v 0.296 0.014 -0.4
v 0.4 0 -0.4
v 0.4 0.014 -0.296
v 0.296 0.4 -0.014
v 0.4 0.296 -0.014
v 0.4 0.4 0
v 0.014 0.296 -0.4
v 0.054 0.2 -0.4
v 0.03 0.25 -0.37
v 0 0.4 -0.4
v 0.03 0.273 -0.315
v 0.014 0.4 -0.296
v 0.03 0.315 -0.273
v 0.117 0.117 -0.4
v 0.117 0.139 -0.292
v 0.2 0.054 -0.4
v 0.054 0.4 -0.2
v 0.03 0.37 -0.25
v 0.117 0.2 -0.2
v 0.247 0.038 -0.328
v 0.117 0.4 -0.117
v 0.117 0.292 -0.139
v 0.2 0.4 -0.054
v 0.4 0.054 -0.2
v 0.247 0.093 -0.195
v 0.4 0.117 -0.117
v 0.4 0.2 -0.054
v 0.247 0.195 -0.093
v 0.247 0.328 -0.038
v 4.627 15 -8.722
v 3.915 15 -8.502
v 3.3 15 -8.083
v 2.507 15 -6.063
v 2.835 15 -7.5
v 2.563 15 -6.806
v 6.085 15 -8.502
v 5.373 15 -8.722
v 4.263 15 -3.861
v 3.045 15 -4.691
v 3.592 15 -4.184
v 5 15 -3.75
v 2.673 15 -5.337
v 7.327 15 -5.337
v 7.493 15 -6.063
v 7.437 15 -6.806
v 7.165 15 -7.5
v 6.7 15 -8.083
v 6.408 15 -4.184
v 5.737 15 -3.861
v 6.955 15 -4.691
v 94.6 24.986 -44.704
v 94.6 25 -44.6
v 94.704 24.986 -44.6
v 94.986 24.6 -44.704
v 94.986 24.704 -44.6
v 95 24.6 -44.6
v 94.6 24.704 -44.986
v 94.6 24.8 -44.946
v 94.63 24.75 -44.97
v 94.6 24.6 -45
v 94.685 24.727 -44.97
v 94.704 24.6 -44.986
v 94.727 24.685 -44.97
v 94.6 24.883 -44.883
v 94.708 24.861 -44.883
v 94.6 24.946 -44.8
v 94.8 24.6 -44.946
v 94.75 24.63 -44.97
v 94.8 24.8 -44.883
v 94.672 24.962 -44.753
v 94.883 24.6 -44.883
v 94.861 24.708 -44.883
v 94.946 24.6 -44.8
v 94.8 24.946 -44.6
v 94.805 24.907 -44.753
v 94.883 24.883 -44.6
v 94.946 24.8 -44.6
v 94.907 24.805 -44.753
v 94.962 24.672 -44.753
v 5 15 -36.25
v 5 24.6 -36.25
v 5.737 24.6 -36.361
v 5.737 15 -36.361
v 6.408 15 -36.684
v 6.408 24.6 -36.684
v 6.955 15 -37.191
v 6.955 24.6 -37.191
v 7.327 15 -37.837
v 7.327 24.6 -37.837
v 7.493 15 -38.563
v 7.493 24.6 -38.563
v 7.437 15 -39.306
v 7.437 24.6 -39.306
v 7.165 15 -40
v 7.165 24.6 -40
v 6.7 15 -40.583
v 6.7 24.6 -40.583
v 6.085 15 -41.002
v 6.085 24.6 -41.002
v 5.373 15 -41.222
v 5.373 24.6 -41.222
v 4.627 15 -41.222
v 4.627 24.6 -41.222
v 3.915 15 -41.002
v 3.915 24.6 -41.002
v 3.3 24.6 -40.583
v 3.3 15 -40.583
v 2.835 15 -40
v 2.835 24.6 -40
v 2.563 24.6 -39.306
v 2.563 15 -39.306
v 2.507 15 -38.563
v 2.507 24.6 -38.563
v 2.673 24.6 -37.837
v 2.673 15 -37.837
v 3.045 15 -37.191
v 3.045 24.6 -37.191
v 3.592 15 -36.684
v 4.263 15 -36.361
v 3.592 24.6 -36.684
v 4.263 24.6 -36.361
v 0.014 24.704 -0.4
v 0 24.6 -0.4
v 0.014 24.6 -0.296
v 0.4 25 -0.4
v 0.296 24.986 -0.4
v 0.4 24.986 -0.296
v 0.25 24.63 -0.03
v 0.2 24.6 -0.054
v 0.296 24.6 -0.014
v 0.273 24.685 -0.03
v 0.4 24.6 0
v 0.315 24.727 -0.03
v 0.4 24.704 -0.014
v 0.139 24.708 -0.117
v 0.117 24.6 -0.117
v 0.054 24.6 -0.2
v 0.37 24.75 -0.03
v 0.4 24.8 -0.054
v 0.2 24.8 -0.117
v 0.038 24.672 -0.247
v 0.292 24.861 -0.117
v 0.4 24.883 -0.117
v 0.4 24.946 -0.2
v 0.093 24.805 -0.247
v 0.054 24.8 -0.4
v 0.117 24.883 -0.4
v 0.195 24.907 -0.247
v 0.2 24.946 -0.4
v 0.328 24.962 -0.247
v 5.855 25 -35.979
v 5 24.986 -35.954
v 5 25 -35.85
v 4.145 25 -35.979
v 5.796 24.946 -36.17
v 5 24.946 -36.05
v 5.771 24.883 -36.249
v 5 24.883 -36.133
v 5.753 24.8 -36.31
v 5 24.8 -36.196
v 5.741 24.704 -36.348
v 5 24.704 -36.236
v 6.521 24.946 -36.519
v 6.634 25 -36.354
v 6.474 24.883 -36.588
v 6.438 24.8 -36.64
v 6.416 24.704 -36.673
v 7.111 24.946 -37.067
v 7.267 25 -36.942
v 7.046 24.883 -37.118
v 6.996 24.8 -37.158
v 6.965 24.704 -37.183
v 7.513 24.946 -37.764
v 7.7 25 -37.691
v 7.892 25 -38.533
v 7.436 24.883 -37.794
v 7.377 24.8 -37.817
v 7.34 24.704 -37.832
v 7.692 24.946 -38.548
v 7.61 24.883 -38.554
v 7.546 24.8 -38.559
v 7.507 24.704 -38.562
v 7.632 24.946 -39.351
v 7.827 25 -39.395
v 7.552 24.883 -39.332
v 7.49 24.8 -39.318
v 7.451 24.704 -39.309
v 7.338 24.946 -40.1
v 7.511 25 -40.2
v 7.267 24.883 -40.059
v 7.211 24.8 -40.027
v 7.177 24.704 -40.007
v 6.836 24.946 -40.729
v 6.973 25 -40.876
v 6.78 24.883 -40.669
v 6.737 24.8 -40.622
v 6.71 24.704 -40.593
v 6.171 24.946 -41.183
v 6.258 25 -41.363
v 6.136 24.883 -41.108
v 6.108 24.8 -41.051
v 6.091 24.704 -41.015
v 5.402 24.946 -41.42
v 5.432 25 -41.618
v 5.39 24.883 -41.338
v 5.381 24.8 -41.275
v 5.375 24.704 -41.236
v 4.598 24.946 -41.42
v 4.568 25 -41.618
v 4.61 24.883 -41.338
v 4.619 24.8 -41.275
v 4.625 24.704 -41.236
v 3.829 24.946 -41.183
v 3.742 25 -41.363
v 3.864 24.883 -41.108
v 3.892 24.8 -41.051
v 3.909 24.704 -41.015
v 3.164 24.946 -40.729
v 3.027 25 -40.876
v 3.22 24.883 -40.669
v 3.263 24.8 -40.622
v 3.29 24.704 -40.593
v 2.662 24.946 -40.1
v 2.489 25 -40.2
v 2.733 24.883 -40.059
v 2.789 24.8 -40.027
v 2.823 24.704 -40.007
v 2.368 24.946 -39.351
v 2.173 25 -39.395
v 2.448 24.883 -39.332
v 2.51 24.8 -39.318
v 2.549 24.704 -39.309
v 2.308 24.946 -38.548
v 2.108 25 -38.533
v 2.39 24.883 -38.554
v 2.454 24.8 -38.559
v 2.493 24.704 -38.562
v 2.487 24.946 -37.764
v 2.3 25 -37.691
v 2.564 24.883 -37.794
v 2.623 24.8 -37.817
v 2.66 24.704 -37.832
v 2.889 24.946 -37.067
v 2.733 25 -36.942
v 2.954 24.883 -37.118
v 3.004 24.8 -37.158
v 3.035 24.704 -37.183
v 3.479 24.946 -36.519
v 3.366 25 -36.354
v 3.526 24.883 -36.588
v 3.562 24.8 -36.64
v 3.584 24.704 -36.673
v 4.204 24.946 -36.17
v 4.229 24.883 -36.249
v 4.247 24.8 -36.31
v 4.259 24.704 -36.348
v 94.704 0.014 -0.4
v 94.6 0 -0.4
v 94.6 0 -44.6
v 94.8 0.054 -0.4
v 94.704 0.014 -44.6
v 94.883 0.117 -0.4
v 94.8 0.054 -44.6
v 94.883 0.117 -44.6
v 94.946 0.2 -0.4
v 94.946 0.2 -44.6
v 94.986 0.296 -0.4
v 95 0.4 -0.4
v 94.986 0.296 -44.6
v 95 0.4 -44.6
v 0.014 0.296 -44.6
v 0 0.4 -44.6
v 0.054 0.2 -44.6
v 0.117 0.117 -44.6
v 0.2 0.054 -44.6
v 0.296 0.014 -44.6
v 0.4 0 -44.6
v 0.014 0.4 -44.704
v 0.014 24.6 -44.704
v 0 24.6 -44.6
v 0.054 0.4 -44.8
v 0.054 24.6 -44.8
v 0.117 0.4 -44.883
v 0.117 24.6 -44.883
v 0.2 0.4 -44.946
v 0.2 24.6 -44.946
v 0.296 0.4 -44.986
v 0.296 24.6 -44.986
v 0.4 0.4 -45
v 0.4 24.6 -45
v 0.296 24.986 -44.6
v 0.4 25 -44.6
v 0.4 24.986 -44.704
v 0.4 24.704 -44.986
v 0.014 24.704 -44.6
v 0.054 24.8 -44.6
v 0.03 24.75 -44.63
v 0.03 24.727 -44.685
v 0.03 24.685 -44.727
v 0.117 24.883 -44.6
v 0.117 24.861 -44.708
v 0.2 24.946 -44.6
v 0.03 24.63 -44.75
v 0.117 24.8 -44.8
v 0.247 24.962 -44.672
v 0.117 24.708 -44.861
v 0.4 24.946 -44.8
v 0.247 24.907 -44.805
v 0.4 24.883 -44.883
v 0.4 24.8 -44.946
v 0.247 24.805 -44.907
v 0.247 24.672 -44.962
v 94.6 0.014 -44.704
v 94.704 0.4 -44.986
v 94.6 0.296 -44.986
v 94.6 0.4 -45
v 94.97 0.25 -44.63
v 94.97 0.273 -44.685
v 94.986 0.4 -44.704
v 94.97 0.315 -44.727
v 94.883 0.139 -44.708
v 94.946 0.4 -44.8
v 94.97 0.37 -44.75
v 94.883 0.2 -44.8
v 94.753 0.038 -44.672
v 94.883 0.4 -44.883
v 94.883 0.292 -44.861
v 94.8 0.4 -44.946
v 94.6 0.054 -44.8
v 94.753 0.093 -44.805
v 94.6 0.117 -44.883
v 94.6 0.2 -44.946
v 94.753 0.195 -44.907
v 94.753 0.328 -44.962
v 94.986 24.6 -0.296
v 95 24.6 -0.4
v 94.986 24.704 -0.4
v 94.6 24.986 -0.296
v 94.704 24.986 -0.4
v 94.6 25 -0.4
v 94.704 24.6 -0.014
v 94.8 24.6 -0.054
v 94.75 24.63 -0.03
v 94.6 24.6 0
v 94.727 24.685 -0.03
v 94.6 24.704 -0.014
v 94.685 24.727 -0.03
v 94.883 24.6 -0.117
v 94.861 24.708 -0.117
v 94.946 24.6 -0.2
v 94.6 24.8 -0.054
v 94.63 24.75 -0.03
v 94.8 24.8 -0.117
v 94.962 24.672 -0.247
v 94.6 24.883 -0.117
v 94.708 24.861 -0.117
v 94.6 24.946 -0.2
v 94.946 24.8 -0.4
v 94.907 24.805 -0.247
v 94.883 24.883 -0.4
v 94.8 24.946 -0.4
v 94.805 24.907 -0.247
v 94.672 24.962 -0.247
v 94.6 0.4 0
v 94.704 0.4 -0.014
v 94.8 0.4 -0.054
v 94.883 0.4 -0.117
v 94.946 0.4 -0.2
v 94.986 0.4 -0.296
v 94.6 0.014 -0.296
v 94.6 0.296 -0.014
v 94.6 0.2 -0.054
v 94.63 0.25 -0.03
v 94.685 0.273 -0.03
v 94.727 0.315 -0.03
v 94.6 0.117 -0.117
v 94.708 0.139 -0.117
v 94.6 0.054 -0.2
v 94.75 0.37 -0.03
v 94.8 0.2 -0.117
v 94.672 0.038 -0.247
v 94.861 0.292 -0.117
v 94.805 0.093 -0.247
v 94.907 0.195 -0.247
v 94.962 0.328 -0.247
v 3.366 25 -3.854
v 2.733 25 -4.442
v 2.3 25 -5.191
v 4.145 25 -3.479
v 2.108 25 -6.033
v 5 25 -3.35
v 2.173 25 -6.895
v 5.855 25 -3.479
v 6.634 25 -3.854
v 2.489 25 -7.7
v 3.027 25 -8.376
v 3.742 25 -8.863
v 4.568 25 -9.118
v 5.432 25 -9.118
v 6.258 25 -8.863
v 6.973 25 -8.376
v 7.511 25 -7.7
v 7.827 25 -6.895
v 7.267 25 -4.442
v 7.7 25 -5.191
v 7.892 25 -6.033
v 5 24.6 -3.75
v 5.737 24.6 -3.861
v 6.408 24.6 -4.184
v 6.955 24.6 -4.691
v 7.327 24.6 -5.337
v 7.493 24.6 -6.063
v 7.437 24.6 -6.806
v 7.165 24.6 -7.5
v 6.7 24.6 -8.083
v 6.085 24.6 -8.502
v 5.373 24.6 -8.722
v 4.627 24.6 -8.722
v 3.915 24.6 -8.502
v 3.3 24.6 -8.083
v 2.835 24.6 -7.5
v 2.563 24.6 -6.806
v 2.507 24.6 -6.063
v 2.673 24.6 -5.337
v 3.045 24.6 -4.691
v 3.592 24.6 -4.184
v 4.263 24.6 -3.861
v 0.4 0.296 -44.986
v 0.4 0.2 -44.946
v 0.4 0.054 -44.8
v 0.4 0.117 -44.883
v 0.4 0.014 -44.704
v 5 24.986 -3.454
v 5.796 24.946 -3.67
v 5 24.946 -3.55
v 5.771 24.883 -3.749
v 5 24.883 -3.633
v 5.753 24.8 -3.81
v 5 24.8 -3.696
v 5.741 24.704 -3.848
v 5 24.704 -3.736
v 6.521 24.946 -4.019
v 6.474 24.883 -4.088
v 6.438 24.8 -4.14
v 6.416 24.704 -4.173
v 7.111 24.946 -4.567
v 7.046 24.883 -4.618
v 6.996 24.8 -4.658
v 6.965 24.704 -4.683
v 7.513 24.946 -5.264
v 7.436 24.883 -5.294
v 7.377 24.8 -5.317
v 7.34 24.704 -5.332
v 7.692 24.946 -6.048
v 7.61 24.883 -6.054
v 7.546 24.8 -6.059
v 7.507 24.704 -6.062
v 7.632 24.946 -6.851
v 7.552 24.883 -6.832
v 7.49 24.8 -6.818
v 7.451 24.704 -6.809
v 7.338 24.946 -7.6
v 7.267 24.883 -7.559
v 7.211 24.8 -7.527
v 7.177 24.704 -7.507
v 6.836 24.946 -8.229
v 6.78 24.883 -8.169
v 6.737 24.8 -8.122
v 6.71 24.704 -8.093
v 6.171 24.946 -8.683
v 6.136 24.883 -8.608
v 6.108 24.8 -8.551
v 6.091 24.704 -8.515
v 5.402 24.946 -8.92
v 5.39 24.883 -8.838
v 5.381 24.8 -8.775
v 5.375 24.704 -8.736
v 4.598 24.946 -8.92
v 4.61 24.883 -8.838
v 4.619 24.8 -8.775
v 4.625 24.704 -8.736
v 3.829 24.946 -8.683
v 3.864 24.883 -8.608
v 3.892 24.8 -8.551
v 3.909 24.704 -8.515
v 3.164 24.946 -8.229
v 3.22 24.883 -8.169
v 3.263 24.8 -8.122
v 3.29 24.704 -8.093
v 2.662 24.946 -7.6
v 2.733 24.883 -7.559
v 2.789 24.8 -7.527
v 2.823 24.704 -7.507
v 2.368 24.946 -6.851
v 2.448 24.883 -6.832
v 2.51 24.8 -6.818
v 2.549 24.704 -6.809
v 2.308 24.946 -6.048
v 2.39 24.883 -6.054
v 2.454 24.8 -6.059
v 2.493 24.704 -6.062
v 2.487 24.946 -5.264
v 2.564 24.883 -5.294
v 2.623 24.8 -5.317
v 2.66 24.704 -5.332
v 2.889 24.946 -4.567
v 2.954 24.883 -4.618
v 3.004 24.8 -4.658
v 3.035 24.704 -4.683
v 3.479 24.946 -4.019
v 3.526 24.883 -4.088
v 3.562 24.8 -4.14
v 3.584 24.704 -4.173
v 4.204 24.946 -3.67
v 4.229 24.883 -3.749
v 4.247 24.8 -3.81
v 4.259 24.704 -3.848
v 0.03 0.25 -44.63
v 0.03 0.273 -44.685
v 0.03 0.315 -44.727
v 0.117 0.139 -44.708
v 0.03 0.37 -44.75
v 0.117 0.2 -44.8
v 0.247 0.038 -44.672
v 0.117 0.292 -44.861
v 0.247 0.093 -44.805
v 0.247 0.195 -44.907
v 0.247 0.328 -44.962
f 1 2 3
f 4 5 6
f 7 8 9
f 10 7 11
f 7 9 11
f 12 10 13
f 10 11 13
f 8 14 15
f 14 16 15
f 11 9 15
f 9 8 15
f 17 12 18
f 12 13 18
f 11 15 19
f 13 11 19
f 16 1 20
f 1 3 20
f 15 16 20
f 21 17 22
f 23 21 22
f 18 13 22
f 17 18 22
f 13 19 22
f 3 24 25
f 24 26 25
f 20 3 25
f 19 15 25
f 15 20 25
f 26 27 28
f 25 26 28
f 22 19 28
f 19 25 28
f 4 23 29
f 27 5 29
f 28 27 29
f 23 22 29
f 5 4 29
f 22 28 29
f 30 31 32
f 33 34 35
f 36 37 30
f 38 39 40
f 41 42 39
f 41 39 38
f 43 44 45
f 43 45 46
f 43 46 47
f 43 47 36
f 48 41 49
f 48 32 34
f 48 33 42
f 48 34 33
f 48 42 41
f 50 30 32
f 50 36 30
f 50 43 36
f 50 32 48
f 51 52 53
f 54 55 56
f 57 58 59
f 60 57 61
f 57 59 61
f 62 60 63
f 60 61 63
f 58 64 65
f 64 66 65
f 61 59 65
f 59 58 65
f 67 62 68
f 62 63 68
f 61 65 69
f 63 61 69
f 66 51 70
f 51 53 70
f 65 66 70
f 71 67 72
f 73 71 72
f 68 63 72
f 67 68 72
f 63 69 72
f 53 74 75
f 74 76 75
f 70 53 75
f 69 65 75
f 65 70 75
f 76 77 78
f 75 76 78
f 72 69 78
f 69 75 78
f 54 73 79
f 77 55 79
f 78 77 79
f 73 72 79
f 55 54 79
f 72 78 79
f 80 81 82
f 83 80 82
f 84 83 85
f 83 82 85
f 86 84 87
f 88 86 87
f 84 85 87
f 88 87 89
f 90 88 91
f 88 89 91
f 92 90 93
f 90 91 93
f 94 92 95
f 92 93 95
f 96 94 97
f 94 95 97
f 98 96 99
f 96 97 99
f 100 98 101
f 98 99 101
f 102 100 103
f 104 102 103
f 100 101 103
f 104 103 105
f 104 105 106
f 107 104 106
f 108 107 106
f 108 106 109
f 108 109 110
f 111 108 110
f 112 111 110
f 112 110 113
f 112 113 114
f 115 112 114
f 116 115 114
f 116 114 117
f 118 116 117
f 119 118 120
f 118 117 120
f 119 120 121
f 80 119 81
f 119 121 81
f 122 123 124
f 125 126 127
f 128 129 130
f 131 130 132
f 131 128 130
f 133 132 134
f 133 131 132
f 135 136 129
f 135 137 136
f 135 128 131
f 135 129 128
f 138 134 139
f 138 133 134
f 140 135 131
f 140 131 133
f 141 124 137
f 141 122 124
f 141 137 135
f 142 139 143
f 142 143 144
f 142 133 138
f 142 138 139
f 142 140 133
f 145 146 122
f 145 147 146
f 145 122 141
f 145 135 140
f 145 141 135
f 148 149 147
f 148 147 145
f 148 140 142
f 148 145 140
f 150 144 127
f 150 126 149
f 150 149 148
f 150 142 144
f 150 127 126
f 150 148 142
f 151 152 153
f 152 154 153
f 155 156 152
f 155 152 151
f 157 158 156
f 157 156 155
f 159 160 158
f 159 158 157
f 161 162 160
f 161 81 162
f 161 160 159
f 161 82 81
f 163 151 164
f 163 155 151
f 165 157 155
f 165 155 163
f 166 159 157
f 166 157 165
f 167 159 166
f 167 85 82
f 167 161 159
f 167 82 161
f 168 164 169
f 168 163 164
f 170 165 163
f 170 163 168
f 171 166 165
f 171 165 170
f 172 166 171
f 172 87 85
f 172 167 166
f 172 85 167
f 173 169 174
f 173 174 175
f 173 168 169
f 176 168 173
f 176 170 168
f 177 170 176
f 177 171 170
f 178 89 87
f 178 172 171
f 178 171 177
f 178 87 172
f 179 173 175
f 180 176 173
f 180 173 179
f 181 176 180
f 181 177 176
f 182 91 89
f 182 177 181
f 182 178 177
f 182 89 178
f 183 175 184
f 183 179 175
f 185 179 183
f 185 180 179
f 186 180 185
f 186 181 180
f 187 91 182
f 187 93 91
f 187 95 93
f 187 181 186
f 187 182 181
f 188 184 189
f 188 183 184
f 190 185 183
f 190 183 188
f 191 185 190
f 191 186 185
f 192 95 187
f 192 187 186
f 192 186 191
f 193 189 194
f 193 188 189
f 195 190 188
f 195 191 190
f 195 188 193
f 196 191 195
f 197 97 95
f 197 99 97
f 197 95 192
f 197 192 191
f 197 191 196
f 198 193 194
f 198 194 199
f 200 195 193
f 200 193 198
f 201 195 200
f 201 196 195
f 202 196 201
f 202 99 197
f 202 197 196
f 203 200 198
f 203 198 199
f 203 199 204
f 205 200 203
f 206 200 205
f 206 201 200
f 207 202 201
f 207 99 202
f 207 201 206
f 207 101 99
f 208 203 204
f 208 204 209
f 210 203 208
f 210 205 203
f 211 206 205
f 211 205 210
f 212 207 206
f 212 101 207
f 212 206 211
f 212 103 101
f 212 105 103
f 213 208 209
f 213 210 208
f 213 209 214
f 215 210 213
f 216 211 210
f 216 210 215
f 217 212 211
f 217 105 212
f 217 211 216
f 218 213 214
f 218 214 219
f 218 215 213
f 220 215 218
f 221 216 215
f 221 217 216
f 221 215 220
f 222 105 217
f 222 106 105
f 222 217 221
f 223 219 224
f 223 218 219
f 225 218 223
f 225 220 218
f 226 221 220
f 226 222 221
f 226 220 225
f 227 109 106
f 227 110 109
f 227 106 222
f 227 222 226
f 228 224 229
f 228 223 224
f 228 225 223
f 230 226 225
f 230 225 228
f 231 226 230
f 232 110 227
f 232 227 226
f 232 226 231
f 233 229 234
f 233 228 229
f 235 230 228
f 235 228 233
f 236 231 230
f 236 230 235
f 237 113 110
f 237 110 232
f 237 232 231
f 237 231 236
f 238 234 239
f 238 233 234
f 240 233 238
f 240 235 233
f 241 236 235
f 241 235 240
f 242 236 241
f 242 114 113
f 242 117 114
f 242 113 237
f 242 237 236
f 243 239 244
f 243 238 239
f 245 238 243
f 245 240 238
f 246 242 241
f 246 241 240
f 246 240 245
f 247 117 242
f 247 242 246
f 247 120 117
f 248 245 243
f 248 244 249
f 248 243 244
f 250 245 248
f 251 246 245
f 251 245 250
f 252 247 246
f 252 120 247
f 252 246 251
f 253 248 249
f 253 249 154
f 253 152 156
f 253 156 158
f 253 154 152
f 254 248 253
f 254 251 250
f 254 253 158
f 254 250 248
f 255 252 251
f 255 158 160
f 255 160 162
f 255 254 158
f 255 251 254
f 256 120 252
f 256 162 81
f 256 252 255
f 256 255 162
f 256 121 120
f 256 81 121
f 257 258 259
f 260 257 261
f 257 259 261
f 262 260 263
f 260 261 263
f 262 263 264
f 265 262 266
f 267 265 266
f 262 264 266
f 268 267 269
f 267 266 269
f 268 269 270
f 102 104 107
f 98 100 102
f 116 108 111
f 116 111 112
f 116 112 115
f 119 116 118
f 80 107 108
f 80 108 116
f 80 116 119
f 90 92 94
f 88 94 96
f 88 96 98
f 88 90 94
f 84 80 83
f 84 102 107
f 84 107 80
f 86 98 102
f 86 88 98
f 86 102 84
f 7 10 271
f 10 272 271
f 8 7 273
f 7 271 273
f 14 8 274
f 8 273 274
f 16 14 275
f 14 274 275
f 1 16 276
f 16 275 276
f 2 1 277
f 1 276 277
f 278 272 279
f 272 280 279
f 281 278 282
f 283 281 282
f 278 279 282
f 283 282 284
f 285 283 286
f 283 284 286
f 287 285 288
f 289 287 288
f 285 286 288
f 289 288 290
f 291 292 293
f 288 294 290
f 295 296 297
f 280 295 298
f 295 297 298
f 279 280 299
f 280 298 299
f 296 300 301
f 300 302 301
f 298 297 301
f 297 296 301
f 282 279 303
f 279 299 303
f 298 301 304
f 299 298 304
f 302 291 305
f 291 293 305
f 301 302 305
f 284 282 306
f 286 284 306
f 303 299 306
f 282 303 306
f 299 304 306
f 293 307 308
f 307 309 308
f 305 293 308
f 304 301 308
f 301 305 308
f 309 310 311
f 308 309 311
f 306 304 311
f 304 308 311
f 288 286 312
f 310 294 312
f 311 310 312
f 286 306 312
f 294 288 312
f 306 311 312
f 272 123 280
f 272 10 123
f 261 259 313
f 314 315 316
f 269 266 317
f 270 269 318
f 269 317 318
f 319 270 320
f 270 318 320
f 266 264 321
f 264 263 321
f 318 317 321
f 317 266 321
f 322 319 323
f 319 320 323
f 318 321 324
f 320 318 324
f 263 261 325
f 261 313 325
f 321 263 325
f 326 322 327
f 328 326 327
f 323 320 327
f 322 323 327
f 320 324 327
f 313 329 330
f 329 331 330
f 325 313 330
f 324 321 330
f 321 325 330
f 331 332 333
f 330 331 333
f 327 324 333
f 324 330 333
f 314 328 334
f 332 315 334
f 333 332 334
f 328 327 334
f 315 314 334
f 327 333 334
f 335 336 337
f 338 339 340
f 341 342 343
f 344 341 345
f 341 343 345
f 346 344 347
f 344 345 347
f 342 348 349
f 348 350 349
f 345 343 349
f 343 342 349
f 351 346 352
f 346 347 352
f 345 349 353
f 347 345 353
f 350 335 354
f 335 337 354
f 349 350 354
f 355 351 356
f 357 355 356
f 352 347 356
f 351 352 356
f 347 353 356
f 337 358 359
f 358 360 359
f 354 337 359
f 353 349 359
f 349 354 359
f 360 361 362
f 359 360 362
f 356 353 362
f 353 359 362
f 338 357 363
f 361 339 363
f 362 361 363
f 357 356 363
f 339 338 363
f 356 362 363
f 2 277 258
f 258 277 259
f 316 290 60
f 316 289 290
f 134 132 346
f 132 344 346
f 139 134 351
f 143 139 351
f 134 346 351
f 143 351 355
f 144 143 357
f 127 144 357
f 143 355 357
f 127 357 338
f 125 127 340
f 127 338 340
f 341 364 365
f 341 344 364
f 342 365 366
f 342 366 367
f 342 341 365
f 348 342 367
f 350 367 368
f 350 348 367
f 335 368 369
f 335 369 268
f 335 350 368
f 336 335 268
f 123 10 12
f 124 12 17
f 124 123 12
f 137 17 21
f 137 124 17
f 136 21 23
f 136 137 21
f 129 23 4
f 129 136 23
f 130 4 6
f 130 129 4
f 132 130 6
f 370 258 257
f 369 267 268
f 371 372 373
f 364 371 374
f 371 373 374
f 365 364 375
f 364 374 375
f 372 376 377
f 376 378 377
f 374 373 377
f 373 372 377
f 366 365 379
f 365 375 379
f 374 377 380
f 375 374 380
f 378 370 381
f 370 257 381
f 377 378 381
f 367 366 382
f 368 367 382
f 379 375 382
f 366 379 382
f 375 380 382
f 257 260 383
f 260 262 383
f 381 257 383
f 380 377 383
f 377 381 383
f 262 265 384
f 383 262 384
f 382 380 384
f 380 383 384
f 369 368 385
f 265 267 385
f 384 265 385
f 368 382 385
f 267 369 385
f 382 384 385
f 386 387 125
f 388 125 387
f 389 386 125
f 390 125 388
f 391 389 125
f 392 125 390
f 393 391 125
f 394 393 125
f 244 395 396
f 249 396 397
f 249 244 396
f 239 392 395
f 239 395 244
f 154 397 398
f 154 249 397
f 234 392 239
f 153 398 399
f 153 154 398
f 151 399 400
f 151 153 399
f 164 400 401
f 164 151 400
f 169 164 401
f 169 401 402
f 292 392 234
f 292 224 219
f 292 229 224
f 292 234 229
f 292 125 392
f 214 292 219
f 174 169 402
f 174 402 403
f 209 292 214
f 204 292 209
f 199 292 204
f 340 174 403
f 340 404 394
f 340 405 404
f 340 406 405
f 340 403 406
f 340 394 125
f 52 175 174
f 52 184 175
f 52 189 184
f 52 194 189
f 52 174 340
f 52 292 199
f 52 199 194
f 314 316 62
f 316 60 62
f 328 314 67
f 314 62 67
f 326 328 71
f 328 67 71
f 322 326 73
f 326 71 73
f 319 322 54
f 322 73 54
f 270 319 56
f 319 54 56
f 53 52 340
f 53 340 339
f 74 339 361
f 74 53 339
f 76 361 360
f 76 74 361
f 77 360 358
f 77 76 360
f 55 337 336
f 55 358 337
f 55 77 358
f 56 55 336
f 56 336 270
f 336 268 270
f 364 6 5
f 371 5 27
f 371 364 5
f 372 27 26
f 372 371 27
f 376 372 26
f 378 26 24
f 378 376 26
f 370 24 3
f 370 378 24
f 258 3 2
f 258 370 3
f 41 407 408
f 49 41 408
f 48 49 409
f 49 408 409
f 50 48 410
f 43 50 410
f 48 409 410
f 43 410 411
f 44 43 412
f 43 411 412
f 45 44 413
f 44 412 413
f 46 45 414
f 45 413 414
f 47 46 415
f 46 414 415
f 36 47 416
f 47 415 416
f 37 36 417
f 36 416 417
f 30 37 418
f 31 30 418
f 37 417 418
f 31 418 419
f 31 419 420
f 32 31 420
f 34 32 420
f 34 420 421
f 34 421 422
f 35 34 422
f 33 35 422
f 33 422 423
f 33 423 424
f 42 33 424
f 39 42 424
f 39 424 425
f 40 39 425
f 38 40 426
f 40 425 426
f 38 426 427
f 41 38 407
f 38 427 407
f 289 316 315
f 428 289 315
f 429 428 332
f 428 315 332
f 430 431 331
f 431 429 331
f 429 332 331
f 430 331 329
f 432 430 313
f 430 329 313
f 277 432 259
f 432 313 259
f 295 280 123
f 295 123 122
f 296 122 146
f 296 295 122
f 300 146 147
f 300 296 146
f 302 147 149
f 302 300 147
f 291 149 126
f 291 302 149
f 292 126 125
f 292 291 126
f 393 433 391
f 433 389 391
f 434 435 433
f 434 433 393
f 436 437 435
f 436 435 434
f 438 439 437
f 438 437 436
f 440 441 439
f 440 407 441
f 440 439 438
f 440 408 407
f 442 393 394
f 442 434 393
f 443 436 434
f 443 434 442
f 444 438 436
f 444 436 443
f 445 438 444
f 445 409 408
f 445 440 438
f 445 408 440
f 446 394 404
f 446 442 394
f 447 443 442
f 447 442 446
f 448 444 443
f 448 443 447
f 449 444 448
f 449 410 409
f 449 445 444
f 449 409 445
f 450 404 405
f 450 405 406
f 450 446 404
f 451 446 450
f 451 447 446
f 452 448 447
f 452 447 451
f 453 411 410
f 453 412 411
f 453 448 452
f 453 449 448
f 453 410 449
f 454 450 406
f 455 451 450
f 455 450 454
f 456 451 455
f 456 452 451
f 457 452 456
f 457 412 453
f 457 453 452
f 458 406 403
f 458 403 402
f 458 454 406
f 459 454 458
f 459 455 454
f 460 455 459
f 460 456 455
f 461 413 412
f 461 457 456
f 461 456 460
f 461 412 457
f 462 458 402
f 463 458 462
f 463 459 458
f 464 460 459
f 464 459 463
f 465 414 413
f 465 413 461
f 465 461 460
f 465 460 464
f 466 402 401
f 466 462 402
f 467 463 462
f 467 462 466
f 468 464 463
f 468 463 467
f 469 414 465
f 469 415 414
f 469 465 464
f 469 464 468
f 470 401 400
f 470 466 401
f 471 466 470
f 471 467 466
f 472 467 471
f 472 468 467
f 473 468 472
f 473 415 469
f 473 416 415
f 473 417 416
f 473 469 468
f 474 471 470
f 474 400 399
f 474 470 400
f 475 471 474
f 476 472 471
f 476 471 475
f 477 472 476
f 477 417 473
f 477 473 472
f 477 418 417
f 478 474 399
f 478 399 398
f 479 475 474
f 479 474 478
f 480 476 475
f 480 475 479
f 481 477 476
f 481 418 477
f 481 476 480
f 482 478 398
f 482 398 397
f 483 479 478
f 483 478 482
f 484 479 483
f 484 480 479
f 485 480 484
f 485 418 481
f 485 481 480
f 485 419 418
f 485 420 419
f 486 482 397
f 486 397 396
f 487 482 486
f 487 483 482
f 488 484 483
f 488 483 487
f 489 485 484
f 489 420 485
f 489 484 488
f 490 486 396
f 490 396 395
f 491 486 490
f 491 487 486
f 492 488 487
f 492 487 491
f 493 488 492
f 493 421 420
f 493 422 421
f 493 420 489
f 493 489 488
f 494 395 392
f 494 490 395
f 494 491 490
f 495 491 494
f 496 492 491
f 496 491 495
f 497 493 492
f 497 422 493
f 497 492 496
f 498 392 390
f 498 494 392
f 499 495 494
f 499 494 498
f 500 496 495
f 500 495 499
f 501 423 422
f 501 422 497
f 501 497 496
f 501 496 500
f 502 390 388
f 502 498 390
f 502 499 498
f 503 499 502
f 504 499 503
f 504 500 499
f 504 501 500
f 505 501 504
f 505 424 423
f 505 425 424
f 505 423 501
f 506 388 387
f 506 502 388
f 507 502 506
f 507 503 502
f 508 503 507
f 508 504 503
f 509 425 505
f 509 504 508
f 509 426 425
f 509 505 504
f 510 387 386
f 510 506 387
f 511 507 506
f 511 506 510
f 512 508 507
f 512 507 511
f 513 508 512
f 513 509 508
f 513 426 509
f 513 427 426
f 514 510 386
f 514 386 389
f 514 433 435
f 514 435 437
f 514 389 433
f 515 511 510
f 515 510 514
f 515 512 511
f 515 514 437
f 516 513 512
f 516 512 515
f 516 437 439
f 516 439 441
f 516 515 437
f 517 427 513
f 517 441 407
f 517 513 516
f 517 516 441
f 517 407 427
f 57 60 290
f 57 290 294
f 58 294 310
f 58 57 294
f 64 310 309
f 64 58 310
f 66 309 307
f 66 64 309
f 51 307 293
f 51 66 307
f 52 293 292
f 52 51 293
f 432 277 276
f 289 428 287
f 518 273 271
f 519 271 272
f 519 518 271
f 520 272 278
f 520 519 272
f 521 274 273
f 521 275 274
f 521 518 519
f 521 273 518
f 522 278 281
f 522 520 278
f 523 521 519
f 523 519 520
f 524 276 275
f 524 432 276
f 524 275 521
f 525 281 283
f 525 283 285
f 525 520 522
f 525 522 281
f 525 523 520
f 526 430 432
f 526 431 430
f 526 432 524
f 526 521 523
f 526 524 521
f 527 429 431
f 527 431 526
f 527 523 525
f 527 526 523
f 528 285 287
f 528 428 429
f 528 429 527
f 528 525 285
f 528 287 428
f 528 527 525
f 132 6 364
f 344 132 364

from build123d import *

# Parameters (mm, degrees)
SKETCH1_W           = 95
SKETCH1_H           = 45
BOSS_EXTRUDE1_DEPTH = 25
SKETCH2_R           = 2.5
CUT_EXTRUDE1_DEPTH  = 10
FILLET1_R           = 0.4


with BuildPart() as part:
    # Sketch1 → Boss-Extrude1 (new body)
    with BuildSketch(Plane(origin=(0, 0, 0), x_dir=(1, 0, 0), z_dir=(0, 1, 0))):
        with Locations((47.5, 22.5)):
            Rectangle(SKETCH1_W, SKETCH1_H)
    extrude(amount=BOSS_EXTRUDE1_DEPTH)

    # Sketch2 → Cut-Extrude1 (cut)
    with BuildSketch(Plane(origin=(0, 25, 0), x_dir=(1, 0, 0), z_dir=(0, 1, 0))):
        with Locations(Location((5, 38.75, 0), (0, 0, 270))):
            Circle(SKETCH2_R)
        with Locations(Location((5, 6.25, 0), (0, 0, 270))):
            Circle(SKETCH2_R)
    extrude(amount=-CUT_EXTRUDE1_DEPTH, mode=Mode.SUBTRACT)

    # Fillet1
    fillet1_edges = [part.edges().sort_by_distance(p)[0] for p in [
        (95, 25, -22.5),
        (5, 25, -41.25),
        (47.5, 25, -45),
        (5, 25, -8.75),
        (0, 25, -22.5),
        (47.5, 0, -45),
        (95, 0, -22.5),
        (47.5, 0, 0),
        (0, 0, -22.5),
        (0, 12.5, -45),
        (95, 12.5, -45),
        (95, 12.5, 0),
        (0, 12.5, 0),
        (47.5, 25, 0),
    ]]
    fillet(fillet1_edges, radius=FILLET1_R)


solid = part.part
